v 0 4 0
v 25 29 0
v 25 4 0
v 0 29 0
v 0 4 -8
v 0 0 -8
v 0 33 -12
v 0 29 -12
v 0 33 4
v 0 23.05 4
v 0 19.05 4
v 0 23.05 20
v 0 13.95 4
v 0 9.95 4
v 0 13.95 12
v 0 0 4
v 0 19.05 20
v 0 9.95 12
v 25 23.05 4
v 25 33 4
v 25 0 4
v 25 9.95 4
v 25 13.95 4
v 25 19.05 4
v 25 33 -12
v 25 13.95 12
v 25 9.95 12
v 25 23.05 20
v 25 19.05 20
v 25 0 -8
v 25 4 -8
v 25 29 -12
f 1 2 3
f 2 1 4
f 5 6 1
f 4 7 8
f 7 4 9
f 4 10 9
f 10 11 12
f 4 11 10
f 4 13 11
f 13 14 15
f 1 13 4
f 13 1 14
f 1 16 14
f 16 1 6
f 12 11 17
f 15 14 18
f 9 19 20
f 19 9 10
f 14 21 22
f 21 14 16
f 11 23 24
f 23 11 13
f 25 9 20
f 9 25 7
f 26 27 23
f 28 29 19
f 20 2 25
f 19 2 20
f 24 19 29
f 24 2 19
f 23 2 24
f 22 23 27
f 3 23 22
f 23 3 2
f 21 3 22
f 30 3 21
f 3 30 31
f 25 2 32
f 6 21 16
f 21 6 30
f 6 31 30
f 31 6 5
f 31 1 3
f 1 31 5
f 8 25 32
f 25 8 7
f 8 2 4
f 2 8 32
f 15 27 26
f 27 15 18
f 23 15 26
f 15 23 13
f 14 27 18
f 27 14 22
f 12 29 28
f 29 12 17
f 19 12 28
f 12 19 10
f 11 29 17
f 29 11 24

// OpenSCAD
// Thin sign mount for the top of my Dell monitor.

monitor_depth = 25.0; // mm
sign_depth    =  5.1;
front_drop    =  8.0;
back_drop     = 12.0;

width = monitor_depth;

front_height = front_drop;
back_height  = 2 * front_height;
thickness    = 4.0;

module monitor_clip() {
  linear_extrude(thickness)
    square([width, monitor_depth + 2*thickness]);
  translate([0, 0, -front_drop])
    linear_extrude(front_drop)
    square([width, thickness]);
  translate([0, monitor_depth + thickness, -back_drop])
    linear_extrude(back_drop)
    square([width, thickness]);
}

module sign_holder() {
  linear_extrude(front_height)
    square([width, thickness]);
  translate([0, sign_depth+thickness, 0])
    linear_extrude(back_height)
    square([width, thickness]);
}
monitor_clip();
translate([0, monitor_depth/2 - sign_depth/2, thickness]) sign_holder();
